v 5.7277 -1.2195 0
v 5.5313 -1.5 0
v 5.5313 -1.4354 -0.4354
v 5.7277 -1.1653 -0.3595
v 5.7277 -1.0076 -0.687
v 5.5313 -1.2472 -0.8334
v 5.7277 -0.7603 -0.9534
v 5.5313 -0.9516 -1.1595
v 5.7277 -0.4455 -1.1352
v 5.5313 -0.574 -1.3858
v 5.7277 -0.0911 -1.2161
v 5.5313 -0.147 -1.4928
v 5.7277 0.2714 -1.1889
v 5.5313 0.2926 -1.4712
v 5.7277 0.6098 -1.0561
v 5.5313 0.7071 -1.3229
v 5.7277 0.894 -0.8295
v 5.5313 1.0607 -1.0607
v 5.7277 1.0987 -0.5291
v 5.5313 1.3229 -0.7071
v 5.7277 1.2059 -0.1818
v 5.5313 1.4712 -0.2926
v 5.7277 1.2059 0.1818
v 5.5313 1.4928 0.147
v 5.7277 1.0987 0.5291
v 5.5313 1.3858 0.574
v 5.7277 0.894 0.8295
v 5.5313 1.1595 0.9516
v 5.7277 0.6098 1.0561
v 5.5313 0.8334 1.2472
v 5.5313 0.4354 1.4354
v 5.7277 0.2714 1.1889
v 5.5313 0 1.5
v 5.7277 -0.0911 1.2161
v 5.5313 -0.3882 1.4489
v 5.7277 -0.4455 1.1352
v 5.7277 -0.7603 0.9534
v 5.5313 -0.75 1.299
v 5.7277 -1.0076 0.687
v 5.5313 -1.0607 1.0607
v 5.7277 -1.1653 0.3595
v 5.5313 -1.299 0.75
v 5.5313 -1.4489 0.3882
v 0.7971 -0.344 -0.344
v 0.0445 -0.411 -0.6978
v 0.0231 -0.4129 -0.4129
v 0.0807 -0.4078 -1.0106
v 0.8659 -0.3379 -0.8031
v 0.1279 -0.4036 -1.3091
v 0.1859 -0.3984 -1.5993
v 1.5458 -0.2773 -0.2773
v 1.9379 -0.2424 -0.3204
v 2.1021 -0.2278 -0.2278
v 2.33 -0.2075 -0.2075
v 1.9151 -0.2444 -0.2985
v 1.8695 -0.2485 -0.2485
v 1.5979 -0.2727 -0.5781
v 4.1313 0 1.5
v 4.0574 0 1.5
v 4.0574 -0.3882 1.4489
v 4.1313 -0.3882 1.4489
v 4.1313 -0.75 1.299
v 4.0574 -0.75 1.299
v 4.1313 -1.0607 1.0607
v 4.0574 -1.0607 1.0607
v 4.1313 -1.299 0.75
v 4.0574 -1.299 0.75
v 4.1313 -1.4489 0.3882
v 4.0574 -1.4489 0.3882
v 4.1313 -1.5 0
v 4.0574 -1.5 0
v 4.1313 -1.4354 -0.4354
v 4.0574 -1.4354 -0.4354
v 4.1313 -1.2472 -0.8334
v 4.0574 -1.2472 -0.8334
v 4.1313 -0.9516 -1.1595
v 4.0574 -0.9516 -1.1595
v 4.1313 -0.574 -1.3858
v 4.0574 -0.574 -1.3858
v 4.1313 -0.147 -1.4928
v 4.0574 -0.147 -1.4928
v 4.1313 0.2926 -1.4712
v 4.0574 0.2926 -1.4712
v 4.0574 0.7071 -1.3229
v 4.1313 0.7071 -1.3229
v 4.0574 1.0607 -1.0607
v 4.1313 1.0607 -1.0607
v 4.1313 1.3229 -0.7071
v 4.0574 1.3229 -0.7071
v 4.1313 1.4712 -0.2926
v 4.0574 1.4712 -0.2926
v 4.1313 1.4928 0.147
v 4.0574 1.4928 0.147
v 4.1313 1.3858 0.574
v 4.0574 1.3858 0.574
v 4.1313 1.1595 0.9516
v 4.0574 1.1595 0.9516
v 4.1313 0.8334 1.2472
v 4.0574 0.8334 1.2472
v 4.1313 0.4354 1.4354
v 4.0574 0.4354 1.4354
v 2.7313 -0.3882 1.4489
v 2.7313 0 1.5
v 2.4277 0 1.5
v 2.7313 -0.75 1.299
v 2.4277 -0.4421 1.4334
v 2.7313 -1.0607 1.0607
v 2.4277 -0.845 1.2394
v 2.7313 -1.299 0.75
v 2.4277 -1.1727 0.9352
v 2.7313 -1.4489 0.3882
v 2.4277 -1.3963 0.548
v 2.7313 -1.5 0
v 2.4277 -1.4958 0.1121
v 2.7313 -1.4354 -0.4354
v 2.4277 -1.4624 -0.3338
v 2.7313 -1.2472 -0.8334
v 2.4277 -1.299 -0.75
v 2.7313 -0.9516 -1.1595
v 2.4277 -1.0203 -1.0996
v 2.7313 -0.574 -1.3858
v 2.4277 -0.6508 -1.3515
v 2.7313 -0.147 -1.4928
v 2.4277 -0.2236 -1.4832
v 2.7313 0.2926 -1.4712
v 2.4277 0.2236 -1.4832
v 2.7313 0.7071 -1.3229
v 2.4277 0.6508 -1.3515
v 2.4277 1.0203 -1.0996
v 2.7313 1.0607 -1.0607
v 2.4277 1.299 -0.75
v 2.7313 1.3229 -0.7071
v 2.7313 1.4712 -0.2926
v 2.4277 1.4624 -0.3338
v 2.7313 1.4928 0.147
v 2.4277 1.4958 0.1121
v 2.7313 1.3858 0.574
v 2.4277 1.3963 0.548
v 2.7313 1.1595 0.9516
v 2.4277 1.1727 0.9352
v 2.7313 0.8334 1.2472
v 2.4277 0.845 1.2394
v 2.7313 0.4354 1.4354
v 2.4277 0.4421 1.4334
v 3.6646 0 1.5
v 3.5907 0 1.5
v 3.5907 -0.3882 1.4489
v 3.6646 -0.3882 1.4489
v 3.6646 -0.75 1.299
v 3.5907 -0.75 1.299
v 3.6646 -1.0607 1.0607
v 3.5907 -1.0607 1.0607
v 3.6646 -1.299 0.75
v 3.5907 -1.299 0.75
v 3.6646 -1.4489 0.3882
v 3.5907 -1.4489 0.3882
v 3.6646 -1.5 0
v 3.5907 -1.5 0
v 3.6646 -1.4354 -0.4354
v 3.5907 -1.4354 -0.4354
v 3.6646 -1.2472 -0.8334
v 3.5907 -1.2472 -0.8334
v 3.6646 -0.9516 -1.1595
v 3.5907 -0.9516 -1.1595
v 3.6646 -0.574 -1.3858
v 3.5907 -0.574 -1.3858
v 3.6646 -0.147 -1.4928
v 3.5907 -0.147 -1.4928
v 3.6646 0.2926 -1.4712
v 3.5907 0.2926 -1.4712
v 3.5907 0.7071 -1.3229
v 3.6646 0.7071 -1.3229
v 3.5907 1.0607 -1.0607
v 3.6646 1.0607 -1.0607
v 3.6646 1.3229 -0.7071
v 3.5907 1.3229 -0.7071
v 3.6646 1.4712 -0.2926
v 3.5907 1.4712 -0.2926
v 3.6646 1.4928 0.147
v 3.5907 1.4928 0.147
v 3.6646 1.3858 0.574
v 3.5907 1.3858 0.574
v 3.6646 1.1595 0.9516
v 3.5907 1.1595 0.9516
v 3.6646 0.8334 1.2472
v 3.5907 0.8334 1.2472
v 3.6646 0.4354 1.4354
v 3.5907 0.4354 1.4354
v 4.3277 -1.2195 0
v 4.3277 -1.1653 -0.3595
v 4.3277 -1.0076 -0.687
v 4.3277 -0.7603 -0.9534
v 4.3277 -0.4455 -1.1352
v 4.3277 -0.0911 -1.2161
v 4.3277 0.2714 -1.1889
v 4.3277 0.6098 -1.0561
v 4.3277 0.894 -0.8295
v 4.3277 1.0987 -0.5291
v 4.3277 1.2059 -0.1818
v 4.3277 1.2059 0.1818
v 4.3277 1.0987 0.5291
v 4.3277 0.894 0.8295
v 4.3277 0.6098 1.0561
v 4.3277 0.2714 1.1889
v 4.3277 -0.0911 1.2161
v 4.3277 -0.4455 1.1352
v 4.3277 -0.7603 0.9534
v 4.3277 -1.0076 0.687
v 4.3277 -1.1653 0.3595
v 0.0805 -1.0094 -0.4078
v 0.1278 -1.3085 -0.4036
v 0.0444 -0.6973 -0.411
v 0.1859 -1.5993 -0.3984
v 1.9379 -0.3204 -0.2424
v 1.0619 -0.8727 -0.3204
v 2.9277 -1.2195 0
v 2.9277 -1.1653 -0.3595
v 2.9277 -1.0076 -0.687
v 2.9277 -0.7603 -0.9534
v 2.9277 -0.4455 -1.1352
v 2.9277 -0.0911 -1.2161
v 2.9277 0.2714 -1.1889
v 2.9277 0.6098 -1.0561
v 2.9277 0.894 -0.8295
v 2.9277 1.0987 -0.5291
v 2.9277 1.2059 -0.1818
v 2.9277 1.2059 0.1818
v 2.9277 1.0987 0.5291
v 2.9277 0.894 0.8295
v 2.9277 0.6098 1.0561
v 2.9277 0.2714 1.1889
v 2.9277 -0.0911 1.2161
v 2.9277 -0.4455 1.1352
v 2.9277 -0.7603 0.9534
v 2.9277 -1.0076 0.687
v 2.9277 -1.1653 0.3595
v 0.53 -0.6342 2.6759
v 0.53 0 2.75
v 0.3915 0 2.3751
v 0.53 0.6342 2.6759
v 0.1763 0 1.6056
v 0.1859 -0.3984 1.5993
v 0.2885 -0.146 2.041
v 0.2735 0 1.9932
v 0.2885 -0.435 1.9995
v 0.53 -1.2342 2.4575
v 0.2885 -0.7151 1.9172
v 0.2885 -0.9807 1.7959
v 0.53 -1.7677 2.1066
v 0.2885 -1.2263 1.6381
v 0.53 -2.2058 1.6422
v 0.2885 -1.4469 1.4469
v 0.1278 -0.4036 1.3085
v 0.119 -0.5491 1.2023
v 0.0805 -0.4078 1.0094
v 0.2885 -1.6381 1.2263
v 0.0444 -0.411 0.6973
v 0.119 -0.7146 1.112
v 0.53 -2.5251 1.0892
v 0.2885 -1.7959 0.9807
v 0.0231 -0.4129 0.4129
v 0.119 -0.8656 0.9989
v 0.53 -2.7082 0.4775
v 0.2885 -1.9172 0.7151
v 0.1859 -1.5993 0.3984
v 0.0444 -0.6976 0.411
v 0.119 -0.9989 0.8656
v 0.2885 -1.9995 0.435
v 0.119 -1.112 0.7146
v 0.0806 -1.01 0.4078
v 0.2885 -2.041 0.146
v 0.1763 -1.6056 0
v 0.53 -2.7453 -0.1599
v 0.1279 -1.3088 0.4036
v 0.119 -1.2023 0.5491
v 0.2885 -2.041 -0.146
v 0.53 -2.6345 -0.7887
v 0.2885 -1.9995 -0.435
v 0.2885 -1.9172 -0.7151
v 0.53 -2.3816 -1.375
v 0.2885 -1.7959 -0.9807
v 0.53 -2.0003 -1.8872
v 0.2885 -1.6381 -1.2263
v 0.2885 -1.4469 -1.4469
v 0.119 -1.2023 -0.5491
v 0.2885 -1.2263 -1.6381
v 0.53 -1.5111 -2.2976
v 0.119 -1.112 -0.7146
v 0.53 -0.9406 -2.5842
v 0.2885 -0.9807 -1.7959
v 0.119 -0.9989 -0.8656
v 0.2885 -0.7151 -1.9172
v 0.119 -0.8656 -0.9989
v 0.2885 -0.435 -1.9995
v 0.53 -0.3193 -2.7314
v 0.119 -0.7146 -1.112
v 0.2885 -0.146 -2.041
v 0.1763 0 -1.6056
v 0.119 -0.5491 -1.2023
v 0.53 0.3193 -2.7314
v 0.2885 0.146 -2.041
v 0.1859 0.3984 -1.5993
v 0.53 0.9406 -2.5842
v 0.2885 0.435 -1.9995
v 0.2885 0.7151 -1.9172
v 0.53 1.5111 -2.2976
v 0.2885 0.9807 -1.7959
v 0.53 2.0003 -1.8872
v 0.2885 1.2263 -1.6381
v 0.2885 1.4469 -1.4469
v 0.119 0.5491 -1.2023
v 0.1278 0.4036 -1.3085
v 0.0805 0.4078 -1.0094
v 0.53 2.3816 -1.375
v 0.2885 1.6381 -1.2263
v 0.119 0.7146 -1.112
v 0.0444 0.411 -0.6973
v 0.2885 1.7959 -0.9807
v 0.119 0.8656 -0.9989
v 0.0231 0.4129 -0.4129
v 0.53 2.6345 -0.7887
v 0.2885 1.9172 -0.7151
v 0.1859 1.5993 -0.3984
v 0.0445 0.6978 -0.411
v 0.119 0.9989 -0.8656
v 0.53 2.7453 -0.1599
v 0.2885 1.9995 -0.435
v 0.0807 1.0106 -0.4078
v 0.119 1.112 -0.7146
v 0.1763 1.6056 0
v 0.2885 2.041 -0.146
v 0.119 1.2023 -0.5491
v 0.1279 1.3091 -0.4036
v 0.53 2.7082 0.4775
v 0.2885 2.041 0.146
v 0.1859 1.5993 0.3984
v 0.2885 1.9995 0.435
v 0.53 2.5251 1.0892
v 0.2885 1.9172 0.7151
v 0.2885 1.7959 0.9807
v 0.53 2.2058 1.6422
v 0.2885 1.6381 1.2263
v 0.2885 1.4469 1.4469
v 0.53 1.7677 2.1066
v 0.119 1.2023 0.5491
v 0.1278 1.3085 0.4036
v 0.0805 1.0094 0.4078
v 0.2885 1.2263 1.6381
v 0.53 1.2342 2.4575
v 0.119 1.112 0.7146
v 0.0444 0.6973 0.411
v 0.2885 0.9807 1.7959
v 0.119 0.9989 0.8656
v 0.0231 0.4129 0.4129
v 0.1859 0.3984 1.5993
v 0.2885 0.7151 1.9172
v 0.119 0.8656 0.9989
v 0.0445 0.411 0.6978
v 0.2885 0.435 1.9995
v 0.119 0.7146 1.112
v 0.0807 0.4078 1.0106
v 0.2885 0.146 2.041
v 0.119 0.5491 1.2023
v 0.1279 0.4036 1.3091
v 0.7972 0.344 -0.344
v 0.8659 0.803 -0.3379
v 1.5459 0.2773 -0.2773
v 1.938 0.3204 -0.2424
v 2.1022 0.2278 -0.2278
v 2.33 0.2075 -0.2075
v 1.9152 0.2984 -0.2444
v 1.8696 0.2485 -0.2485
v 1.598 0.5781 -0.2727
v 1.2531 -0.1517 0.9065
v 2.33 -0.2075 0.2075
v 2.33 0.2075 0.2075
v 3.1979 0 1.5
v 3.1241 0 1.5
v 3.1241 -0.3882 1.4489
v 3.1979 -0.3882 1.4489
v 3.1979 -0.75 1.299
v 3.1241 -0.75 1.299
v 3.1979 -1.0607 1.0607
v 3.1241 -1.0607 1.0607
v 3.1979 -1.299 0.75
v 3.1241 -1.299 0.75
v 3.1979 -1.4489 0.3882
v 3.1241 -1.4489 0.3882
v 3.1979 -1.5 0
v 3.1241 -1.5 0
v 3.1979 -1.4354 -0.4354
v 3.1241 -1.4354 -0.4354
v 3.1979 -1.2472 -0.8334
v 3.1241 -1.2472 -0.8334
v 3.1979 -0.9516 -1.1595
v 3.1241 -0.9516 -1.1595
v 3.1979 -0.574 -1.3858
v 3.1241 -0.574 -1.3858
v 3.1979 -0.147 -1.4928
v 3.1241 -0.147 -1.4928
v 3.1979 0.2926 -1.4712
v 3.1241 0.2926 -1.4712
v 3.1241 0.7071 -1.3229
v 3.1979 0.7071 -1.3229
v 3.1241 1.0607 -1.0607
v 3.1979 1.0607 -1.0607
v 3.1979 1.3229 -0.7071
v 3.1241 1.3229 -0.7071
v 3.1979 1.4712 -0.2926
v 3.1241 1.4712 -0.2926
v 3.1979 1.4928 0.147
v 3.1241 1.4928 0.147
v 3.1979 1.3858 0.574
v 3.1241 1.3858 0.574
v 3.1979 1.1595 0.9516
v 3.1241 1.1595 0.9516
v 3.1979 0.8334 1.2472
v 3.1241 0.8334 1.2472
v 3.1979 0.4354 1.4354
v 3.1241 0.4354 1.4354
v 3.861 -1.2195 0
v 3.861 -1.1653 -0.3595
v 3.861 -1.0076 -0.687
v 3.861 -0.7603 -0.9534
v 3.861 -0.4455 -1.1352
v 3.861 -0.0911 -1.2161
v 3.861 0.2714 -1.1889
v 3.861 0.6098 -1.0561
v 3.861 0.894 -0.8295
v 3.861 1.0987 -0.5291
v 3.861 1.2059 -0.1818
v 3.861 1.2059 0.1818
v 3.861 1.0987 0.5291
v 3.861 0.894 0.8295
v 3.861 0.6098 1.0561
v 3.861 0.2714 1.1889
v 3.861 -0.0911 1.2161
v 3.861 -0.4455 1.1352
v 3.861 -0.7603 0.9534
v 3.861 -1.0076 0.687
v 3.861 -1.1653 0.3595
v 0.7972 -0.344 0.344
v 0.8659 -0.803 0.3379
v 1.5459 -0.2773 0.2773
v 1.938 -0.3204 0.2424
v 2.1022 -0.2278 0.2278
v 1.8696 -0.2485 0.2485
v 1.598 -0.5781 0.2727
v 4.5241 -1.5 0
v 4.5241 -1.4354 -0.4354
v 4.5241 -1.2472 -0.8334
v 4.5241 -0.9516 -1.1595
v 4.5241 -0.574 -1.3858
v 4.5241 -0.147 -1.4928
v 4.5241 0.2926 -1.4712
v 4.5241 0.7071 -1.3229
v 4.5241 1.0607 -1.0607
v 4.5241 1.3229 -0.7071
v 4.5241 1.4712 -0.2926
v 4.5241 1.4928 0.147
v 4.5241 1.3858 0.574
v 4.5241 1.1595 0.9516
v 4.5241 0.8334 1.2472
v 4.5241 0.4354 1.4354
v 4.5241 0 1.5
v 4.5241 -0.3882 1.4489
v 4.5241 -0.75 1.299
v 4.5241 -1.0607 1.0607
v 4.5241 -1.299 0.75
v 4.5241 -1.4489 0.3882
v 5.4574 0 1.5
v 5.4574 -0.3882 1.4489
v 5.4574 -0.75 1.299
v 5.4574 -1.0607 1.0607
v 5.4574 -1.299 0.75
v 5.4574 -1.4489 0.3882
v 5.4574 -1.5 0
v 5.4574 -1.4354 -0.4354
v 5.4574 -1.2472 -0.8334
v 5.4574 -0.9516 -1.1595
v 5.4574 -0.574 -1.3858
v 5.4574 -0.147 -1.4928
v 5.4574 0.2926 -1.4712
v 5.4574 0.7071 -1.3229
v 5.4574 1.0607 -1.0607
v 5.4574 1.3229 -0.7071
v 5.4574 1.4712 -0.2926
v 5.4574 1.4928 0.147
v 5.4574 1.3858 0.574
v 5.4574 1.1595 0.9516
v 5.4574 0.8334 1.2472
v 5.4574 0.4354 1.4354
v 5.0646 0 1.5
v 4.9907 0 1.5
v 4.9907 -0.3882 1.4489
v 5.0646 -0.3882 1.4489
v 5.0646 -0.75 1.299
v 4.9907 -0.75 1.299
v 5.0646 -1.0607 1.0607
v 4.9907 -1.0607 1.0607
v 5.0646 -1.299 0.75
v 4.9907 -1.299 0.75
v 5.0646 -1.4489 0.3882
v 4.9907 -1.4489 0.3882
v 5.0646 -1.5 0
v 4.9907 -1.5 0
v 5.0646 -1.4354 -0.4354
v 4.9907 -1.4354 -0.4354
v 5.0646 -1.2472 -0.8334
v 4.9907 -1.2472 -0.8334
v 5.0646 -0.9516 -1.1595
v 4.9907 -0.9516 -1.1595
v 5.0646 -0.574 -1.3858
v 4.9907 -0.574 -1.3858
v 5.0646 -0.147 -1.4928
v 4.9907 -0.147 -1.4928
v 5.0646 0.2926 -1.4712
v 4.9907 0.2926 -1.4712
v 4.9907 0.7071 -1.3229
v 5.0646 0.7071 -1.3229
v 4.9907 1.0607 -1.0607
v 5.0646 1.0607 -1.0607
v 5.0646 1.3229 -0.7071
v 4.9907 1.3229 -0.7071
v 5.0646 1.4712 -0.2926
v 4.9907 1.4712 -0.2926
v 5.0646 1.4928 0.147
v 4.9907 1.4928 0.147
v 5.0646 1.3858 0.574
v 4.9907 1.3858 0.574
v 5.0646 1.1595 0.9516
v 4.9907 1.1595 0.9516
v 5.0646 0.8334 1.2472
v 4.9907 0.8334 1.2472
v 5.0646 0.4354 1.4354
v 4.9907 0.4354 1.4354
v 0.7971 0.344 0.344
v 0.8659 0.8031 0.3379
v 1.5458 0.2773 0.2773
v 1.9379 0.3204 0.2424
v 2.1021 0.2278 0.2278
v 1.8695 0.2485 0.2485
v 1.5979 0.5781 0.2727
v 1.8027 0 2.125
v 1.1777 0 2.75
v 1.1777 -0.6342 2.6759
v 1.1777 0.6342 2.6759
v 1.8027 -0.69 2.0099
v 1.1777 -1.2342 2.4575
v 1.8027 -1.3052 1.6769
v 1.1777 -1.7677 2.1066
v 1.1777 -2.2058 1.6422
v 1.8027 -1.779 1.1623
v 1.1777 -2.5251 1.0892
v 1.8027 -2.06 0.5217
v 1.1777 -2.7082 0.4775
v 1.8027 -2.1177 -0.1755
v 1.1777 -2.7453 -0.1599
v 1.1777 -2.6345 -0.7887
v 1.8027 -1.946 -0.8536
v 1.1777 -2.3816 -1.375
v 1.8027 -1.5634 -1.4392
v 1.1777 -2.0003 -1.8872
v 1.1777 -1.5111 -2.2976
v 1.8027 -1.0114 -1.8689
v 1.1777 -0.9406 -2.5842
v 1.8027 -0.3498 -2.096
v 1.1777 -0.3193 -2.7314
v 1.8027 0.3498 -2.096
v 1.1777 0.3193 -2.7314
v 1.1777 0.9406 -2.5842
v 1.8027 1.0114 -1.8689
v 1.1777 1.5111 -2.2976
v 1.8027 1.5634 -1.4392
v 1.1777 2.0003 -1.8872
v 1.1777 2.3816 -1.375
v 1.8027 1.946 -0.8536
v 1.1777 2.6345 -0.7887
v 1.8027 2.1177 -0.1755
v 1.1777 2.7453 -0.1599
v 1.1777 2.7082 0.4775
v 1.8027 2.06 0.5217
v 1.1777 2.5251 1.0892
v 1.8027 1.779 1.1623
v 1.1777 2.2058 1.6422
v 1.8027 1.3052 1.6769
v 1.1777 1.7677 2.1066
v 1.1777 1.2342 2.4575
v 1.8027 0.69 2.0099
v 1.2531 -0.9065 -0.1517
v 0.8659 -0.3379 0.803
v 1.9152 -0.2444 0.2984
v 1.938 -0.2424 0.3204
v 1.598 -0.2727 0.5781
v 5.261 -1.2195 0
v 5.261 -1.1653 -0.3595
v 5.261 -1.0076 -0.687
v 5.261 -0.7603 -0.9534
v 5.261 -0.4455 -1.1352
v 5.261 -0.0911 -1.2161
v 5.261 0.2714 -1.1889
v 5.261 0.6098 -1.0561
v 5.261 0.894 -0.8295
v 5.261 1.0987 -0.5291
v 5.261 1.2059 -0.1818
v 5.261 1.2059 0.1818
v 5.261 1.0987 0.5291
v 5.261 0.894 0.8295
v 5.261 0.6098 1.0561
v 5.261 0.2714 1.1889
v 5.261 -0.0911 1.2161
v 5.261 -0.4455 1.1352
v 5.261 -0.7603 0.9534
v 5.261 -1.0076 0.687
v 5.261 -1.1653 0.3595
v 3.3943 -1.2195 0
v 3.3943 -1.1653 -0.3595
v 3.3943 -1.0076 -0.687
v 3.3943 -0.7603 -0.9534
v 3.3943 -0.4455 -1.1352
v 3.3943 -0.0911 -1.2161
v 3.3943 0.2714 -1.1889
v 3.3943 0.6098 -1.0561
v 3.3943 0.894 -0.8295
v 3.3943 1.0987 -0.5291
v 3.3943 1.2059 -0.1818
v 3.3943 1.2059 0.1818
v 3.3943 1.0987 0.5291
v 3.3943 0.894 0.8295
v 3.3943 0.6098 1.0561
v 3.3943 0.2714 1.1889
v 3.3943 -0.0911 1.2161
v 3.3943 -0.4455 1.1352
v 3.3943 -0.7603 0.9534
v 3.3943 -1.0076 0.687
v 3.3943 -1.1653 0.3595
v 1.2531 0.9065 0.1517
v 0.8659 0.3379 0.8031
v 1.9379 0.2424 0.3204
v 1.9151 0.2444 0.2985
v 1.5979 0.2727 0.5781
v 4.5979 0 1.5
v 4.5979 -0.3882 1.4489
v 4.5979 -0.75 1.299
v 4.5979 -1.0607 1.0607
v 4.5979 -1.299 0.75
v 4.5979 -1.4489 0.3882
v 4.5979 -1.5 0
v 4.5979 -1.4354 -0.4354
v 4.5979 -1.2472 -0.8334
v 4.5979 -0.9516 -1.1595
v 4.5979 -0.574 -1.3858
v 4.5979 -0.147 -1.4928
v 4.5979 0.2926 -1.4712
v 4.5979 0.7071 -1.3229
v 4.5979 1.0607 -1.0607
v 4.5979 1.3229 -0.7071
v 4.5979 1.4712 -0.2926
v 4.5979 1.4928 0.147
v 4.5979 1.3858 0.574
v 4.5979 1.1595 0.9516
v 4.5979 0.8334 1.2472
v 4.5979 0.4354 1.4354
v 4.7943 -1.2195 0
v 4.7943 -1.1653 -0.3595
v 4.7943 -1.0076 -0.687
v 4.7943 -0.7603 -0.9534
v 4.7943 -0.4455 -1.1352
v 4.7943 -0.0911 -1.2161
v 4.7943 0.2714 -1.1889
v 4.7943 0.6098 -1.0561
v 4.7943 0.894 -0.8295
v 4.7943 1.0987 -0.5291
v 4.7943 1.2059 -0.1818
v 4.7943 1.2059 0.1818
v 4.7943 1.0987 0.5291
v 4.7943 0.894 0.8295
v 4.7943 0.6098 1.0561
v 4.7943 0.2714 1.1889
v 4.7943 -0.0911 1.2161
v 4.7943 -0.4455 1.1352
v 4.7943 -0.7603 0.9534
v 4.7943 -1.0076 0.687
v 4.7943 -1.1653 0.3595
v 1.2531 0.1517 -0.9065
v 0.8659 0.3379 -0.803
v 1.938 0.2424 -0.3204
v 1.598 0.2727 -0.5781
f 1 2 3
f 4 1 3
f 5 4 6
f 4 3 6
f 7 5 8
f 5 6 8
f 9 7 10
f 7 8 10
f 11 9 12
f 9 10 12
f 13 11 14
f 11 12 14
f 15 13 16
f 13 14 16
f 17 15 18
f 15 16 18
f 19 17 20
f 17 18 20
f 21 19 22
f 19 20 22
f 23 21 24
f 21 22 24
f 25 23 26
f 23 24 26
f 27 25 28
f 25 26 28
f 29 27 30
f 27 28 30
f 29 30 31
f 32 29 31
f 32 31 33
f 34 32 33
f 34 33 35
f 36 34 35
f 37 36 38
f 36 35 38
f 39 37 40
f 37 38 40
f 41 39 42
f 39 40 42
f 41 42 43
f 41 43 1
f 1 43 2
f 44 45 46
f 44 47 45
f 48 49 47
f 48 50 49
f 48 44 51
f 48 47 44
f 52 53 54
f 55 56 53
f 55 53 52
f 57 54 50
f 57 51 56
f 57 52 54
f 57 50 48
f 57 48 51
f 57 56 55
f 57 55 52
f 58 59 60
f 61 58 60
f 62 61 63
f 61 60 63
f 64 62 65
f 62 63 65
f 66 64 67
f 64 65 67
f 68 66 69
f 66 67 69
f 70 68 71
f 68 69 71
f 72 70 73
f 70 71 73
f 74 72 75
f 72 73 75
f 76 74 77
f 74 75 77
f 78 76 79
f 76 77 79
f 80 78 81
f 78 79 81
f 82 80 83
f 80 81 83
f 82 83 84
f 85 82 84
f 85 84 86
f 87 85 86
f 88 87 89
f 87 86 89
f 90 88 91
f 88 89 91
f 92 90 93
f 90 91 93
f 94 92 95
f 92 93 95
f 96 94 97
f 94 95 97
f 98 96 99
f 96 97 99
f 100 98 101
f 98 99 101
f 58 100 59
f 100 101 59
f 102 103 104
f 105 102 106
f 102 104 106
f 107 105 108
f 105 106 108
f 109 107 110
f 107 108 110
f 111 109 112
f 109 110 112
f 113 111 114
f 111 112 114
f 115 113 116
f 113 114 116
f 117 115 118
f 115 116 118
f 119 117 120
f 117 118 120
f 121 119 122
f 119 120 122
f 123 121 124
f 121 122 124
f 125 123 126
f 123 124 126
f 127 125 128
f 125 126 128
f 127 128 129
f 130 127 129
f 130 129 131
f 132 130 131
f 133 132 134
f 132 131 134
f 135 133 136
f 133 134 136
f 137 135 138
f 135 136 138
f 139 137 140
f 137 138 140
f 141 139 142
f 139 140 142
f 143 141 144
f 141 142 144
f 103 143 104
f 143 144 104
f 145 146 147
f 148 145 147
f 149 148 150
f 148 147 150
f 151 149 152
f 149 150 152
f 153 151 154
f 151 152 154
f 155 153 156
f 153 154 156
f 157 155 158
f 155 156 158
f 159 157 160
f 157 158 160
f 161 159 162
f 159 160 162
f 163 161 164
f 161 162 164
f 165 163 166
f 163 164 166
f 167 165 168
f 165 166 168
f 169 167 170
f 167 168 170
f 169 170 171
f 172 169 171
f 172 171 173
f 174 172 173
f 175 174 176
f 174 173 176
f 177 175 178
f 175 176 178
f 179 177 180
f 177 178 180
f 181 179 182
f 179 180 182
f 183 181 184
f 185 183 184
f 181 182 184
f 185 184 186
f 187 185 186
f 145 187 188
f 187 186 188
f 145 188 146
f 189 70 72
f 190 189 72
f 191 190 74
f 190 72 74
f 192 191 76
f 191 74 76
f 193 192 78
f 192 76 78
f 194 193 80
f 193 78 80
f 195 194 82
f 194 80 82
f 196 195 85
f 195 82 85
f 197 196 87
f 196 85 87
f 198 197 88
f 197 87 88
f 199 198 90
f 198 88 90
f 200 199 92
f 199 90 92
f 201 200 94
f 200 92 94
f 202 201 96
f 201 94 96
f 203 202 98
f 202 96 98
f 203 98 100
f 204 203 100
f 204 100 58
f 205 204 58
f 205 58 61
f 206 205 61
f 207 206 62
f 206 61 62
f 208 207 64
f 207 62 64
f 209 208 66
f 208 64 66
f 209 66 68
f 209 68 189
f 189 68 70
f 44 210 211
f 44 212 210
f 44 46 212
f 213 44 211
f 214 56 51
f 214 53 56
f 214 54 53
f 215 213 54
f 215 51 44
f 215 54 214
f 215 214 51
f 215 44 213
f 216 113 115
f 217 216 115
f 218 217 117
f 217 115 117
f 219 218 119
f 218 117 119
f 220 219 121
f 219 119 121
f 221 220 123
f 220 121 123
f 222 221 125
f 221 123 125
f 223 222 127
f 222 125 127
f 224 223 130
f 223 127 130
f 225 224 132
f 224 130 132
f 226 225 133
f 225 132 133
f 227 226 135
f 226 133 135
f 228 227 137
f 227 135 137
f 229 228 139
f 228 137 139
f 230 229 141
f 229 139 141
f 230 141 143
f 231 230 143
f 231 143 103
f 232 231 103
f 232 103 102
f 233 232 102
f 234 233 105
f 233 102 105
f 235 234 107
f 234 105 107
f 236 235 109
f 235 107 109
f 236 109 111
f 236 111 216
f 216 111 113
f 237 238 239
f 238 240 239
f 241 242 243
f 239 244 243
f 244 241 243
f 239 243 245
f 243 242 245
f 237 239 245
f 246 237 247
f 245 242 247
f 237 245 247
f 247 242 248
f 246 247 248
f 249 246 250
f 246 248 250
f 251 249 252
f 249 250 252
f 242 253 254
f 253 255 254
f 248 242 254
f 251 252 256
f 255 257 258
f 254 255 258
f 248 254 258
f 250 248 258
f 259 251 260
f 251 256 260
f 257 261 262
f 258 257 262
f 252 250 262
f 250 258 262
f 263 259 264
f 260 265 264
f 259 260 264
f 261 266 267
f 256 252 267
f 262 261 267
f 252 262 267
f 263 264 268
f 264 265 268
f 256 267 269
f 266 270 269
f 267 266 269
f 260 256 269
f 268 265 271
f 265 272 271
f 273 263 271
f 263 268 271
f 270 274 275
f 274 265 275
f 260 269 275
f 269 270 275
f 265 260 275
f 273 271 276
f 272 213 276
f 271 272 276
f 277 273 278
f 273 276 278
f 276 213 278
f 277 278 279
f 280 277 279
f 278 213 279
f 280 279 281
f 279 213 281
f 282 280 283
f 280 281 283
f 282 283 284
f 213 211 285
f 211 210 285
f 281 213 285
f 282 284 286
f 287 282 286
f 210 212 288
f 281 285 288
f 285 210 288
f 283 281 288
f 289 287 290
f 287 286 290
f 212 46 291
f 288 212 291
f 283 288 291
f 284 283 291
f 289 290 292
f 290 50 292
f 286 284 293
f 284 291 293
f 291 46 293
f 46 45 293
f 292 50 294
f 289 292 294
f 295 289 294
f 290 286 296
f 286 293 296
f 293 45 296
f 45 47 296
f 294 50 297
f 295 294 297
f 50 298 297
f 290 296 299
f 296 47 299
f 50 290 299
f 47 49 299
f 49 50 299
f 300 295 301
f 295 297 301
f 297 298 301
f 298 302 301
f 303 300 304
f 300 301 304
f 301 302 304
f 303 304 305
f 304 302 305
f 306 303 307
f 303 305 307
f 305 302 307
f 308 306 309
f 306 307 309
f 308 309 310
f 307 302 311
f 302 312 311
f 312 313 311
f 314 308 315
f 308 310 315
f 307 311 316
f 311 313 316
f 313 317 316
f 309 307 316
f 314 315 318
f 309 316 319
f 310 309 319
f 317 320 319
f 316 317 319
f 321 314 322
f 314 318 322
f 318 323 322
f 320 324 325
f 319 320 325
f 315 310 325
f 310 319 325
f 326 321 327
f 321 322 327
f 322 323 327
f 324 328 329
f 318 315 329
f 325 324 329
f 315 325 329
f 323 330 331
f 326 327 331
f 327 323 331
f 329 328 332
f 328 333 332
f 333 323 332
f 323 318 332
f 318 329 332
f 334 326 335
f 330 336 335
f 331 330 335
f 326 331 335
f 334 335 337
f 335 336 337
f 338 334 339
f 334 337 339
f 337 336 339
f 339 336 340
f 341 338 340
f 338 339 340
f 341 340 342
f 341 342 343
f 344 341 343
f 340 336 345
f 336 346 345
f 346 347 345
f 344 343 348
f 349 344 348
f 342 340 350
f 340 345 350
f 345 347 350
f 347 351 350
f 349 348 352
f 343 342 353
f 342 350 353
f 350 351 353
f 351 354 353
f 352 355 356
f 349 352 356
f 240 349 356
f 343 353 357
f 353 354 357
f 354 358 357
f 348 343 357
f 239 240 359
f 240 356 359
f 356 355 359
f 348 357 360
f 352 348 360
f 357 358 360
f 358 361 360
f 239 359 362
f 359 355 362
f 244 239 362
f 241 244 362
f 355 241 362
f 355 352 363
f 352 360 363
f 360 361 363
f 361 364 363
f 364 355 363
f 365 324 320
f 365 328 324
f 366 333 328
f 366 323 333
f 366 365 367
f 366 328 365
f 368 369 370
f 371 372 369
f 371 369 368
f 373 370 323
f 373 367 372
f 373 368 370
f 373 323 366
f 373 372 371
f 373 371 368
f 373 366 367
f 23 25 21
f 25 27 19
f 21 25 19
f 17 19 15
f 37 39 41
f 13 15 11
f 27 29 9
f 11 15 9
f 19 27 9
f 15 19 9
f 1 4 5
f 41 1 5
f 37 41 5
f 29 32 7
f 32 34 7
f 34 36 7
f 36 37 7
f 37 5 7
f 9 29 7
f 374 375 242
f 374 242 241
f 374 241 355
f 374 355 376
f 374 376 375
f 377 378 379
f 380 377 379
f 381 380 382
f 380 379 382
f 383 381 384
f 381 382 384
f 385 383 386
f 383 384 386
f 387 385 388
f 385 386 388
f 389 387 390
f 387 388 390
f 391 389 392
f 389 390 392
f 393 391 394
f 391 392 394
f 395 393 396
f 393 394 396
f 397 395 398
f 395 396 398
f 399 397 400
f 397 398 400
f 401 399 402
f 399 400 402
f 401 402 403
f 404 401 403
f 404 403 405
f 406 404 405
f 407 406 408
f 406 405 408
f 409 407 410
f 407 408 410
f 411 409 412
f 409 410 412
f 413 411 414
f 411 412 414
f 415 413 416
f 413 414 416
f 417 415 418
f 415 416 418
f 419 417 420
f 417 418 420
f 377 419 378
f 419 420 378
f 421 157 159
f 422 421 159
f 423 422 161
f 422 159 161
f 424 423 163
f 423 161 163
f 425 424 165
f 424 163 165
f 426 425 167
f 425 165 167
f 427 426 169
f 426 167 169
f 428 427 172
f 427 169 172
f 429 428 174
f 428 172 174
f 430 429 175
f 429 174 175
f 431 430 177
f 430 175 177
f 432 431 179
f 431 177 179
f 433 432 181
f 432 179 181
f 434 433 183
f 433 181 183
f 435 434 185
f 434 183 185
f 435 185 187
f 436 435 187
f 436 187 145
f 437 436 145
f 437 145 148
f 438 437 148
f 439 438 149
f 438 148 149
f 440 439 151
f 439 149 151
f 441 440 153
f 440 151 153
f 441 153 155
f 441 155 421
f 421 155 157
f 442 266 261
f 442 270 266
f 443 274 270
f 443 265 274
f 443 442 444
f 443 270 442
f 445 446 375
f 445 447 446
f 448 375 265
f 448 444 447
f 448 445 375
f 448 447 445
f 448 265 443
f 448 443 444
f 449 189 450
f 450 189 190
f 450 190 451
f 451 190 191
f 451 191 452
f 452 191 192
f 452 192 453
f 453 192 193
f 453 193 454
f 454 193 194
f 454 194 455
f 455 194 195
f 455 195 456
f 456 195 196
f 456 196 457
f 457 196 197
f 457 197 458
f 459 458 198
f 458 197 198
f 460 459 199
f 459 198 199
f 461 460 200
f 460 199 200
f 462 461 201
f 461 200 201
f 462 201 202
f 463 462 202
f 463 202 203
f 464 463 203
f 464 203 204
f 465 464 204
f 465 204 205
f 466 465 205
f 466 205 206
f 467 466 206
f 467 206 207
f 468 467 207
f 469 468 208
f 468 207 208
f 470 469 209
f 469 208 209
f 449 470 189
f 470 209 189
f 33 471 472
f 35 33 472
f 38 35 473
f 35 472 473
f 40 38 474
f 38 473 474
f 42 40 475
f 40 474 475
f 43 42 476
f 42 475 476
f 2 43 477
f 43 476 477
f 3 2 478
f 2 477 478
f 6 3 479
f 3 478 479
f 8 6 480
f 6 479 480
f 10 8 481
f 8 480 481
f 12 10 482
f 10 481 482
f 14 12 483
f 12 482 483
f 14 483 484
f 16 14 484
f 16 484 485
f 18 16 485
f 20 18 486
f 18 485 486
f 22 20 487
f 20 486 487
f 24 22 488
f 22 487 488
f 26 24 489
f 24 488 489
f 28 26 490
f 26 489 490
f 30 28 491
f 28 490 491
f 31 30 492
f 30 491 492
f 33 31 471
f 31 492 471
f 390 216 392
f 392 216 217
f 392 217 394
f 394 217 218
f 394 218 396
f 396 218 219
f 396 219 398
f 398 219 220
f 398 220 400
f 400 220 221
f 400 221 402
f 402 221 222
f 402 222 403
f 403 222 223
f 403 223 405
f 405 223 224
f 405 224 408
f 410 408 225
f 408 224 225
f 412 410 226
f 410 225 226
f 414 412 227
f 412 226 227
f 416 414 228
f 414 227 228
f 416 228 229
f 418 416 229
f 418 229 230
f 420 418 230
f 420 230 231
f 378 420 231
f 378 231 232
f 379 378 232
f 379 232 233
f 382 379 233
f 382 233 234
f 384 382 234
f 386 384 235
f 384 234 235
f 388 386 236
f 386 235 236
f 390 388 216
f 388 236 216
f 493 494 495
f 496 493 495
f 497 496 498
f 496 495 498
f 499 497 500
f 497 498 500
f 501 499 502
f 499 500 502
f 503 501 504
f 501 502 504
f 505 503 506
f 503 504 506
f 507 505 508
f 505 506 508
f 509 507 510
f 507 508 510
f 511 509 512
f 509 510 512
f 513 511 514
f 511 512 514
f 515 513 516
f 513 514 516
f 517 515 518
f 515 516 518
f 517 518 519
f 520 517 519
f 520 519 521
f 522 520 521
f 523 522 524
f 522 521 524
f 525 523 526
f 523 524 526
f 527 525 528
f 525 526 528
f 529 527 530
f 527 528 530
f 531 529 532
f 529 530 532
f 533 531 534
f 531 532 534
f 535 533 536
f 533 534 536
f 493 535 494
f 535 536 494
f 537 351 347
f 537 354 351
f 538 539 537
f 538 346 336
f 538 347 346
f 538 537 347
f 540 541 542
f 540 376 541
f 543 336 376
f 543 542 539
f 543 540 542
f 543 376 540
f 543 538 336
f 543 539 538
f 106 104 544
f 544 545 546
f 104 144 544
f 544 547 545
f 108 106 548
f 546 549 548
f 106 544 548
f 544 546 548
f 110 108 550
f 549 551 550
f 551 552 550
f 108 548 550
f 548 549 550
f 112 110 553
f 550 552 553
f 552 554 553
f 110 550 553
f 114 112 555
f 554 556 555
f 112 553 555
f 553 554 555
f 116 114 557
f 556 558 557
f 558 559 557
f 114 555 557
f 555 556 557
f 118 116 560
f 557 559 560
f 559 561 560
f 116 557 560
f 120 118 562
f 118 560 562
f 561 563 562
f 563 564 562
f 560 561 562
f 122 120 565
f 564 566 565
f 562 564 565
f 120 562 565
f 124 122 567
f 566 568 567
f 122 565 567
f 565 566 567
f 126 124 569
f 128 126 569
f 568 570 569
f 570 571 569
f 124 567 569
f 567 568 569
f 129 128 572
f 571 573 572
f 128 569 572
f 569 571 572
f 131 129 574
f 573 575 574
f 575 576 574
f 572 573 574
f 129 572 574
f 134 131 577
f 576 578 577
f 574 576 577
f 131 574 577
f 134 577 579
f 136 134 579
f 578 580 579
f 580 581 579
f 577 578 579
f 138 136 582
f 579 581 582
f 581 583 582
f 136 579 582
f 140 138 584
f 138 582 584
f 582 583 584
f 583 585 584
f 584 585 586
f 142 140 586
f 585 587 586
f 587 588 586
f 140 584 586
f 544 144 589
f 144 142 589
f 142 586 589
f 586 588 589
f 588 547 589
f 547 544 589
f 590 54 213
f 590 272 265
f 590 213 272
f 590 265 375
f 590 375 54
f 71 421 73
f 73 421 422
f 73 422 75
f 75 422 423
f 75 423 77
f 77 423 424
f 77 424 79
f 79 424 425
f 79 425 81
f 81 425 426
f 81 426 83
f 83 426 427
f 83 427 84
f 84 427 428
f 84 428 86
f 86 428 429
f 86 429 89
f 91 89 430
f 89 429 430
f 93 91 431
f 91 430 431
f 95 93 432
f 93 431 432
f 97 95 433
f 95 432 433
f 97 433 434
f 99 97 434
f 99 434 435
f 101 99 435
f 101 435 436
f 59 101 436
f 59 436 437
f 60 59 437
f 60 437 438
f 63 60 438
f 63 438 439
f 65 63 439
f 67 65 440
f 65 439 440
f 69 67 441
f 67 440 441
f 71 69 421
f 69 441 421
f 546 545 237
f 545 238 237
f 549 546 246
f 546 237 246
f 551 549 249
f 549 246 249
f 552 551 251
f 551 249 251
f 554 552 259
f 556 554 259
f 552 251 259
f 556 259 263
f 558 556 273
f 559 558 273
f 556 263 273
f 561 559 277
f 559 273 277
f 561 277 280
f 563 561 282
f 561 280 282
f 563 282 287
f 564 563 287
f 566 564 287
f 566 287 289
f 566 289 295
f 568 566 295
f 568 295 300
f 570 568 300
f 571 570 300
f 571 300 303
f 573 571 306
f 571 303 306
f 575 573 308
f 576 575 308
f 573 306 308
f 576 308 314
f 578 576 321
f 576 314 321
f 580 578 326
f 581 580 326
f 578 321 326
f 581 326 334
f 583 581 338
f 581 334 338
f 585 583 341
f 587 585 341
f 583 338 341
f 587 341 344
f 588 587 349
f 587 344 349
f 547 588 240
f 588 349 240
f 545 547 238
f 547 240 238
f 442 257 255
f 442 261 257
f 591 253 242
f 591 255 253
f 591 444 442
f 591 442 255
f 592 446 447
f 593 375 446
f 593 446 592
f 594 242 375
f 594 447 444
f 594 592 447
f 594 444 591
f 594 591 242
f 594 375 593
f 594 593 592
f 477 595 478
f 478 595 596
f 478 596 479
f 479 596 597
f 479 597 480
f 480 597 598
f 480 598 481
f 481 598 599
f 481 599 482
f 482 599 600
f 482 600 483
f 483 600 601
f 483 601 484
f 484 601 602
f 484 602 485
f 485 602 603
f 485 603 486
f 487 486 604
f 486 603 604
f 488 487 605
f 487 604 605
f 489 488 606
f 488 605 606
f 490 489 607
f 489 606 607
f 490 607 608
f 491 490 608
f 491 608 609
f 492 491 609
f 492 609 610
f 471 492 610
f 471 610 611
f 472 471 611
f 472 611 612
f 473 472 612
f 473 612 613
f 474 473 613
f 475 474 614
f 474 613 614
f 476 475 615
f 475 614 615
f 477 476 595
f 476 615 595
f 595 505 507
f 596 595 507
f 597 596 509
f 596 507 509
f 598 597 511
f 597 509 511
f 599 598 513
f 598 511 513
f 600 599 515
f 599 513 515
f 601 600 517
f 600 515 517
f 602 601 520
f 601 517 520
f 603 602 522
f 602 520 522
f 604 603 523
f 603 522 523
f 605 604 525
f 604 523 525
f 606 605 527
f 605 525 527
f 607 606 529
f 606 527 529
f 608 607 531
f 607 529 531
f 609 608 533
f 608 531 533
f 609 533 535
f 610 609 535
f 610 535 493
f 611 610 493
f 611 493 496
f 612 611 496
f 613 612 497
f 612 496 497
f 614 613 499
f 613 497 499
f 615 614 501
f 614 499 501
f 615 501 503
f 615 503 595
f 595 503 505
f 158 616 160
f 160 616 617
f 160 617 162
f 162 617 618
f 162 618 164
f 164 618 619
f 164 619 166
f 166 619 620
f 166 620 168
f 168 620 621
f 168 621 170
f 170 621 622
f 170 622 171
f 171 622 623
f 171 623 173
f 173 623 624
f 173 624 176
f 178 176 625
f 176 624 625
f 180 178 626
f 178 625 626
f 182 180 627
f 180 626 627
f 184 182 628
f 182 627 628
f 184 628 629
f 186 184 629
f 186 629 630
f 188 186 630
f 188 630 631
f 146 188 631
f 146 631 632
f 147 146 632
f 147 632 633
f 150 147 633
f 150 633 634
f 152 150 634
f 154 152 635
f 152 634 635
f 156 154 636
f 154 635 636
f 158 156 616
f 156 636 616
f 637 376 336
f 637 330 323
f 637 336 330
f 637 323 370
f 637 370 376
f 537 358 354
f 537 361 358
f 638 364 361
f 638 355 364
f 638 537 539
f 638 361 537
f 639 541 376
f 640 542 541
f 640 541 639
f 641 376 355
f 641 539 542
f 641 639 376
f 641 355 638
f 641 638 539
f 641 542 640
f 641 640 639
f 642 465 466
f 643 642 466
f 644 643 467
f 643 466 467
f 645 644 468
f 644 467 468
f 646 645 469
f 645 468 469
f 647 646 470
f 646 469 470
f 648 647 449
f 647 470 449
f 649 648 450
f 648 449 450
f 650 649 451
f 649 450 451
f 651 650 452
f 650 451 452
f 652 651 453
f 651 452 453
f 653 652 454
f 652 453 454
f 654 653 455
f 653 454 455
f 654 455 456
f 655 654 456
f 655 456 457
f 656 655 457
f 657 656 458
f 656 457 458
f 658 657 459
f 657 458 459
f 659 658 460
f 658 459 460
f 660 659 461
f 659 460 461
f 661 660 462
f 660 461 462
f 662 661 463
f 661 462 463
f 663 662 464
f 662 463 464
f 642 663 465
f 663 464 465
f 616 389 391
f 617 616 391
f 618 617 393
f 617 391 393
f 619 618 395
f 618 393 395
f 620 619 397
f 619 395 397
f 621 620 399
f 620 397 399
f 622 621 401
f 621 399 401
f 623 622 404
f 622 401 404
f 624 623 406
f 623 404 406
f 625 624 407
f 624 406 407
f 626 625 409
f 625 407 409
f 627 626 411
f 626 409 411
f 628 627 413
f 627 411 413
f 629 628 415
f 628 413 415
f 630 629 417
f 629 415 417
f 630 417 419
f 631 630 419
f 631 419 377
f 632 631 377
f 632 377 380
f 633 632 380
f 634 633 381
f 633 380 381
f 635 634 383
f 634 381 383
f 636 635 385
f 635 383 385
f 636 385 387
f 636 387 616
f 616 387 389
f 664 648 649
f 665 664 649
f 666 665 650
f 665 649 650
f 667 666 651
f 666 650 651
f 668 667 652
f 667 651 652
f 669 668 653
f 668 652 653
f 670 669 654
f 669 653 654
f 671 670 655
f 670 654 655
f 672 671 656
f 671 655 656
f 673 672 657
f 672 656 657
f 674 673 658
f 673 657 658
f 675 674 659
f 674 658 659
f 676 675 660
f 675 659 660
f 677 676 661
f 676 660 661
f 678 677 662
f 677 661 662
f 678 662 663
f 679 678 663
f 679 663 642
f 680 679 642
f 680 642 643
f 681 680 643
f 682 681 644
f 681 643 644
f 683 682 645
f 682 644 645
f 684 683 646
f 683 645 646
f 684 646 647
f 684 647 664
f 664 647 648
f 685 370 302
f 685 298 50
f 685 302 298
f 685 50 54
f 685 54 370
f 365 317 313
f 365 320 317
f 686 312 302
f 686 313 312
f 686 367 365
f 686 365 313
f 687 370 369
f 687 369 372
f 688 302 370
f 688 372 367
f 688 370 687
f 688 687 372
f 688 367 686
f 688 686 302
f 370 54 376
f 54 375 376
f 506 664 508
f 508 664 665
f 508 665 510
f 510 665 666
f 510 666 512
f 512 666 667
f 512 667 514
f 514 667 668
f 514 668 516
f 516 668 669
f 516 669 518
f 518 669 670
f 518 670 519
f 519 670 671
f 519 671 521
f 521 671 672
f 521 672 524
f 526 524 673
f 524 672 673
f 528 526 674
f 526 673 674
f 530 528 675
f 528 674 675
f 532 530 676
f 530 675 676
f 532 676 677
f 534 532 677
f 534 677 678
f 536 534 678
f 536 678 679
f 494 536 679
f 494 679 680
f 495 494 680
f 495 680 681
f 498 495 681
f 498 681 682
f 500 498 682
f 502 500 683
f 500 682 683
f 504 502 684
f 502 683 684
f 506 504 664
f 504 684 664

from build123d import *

# Parameters (mm, degrees)
CIRPATTERN1_COUNT = 2
CIRPATTERN1_ANGLE = 90
THDSCHPAT_COUNT   = 7
THDSCHPAT_PITCH   = 0.466666667


with BuildPart() as part:
    # BodySke → Base-Revolve (revolve)
    with BuildSketch(Plane.XY, mode=Mode.PRIVATE) as base_revolve_sk:
        with BuildLine():
            Line((0, 0), (5.727669073, 0))
            Line((5.727669073, 0), (5.727669073, 1.5))
            Line((5.727669073, 1.5), (2.427669073, 1.5))
            Line((2.427669073, 1.5), (1.177669073, 2.75))
            Line((1.177669073, 2.75), (0.529956332, 2.75))
            ThreePointArc((0.529956332, 2.75), (0.133696843, 1.400299407), (0, 0))
        make_face()
    revolve(base_revolve_sk.sketch.rotate(Axis((-15.875, 0, 0), (1, 0, 0)), 90), axis=Axis((-15.875, 0, 0), (1, 0, 0)))

    # Sketch3 → Cross section 0
    with BuildSketch(Plane(origin=(0, 0, 0), x_dir=(0, 0, -1), z_dir=(1, 0, 0))):
        with BuildLine():
            Line((0.415, -1.72), (-0.415, -1.72))
            Line((-0.415, -1.72), (-0.415, 1.72))
            Line((-0.415, 1.72), (0.415, 1.72))
            Line((0.415, 1.72), (0.415, -1.72))
        make_face()
    # Sketch4 → Cross section 1
    with BuildSketch(Plane(origin=(2.33, 0, 0), x_dir=(0, 0, -1), z_dir=(1, 0, 0))):
        with BuildLine():
            Line((0.2075, -0.2075), (-0.2075, -0.2075))
            Line((-0.2075, -0.2075), (-0.2075, 0.2075))
            Line((-0.2075, 0.2075), (0.2075, 0.2075))
            Line((0.2075, 0.2075), (0.2075, -0.2075))
        make_face()
    cross = loft(mode=Mode.SUBTRACT)

    # CirPattern1: Cross ×2 about axis
    cirpattern1_axis = Axis((0, 0, 0), (1, 0, 0))
    for i in range(1, CIRPATTERN1_COUNT):
        add(cross.rotate(cirpattern1_axis, i * CIRPATTERN1_ANGLE / (CIRPATTERN1_COUNT - 1)), mode=Mode.SUBTRACT)

    # ThdSchSke → ThreadSchematic (revolve, cut)
    with BuildSketch(Plane.XY):
        Polygon((2.927669073, -1.2195), (2.731260858, -1.5), (2.731260858, -1.875), (3.124077287, -1.875), (3.124077287, -1.5), align=None)
    threadschematic = revolve(axis=Axis((-3.175, 0, 0), (1, 0, 0)), mode=Mode.SUBTRACT)

    # ThdSchPat: ThreadSchematic ×7
    with Locations(*[(i * THDSCHPAT_PITCH, 0, 0) for i in range(1, THDSCHPAT_COUNT)]):
        add(threadschematic, mode=Mode.SUBTRACT)


solid = part.part
